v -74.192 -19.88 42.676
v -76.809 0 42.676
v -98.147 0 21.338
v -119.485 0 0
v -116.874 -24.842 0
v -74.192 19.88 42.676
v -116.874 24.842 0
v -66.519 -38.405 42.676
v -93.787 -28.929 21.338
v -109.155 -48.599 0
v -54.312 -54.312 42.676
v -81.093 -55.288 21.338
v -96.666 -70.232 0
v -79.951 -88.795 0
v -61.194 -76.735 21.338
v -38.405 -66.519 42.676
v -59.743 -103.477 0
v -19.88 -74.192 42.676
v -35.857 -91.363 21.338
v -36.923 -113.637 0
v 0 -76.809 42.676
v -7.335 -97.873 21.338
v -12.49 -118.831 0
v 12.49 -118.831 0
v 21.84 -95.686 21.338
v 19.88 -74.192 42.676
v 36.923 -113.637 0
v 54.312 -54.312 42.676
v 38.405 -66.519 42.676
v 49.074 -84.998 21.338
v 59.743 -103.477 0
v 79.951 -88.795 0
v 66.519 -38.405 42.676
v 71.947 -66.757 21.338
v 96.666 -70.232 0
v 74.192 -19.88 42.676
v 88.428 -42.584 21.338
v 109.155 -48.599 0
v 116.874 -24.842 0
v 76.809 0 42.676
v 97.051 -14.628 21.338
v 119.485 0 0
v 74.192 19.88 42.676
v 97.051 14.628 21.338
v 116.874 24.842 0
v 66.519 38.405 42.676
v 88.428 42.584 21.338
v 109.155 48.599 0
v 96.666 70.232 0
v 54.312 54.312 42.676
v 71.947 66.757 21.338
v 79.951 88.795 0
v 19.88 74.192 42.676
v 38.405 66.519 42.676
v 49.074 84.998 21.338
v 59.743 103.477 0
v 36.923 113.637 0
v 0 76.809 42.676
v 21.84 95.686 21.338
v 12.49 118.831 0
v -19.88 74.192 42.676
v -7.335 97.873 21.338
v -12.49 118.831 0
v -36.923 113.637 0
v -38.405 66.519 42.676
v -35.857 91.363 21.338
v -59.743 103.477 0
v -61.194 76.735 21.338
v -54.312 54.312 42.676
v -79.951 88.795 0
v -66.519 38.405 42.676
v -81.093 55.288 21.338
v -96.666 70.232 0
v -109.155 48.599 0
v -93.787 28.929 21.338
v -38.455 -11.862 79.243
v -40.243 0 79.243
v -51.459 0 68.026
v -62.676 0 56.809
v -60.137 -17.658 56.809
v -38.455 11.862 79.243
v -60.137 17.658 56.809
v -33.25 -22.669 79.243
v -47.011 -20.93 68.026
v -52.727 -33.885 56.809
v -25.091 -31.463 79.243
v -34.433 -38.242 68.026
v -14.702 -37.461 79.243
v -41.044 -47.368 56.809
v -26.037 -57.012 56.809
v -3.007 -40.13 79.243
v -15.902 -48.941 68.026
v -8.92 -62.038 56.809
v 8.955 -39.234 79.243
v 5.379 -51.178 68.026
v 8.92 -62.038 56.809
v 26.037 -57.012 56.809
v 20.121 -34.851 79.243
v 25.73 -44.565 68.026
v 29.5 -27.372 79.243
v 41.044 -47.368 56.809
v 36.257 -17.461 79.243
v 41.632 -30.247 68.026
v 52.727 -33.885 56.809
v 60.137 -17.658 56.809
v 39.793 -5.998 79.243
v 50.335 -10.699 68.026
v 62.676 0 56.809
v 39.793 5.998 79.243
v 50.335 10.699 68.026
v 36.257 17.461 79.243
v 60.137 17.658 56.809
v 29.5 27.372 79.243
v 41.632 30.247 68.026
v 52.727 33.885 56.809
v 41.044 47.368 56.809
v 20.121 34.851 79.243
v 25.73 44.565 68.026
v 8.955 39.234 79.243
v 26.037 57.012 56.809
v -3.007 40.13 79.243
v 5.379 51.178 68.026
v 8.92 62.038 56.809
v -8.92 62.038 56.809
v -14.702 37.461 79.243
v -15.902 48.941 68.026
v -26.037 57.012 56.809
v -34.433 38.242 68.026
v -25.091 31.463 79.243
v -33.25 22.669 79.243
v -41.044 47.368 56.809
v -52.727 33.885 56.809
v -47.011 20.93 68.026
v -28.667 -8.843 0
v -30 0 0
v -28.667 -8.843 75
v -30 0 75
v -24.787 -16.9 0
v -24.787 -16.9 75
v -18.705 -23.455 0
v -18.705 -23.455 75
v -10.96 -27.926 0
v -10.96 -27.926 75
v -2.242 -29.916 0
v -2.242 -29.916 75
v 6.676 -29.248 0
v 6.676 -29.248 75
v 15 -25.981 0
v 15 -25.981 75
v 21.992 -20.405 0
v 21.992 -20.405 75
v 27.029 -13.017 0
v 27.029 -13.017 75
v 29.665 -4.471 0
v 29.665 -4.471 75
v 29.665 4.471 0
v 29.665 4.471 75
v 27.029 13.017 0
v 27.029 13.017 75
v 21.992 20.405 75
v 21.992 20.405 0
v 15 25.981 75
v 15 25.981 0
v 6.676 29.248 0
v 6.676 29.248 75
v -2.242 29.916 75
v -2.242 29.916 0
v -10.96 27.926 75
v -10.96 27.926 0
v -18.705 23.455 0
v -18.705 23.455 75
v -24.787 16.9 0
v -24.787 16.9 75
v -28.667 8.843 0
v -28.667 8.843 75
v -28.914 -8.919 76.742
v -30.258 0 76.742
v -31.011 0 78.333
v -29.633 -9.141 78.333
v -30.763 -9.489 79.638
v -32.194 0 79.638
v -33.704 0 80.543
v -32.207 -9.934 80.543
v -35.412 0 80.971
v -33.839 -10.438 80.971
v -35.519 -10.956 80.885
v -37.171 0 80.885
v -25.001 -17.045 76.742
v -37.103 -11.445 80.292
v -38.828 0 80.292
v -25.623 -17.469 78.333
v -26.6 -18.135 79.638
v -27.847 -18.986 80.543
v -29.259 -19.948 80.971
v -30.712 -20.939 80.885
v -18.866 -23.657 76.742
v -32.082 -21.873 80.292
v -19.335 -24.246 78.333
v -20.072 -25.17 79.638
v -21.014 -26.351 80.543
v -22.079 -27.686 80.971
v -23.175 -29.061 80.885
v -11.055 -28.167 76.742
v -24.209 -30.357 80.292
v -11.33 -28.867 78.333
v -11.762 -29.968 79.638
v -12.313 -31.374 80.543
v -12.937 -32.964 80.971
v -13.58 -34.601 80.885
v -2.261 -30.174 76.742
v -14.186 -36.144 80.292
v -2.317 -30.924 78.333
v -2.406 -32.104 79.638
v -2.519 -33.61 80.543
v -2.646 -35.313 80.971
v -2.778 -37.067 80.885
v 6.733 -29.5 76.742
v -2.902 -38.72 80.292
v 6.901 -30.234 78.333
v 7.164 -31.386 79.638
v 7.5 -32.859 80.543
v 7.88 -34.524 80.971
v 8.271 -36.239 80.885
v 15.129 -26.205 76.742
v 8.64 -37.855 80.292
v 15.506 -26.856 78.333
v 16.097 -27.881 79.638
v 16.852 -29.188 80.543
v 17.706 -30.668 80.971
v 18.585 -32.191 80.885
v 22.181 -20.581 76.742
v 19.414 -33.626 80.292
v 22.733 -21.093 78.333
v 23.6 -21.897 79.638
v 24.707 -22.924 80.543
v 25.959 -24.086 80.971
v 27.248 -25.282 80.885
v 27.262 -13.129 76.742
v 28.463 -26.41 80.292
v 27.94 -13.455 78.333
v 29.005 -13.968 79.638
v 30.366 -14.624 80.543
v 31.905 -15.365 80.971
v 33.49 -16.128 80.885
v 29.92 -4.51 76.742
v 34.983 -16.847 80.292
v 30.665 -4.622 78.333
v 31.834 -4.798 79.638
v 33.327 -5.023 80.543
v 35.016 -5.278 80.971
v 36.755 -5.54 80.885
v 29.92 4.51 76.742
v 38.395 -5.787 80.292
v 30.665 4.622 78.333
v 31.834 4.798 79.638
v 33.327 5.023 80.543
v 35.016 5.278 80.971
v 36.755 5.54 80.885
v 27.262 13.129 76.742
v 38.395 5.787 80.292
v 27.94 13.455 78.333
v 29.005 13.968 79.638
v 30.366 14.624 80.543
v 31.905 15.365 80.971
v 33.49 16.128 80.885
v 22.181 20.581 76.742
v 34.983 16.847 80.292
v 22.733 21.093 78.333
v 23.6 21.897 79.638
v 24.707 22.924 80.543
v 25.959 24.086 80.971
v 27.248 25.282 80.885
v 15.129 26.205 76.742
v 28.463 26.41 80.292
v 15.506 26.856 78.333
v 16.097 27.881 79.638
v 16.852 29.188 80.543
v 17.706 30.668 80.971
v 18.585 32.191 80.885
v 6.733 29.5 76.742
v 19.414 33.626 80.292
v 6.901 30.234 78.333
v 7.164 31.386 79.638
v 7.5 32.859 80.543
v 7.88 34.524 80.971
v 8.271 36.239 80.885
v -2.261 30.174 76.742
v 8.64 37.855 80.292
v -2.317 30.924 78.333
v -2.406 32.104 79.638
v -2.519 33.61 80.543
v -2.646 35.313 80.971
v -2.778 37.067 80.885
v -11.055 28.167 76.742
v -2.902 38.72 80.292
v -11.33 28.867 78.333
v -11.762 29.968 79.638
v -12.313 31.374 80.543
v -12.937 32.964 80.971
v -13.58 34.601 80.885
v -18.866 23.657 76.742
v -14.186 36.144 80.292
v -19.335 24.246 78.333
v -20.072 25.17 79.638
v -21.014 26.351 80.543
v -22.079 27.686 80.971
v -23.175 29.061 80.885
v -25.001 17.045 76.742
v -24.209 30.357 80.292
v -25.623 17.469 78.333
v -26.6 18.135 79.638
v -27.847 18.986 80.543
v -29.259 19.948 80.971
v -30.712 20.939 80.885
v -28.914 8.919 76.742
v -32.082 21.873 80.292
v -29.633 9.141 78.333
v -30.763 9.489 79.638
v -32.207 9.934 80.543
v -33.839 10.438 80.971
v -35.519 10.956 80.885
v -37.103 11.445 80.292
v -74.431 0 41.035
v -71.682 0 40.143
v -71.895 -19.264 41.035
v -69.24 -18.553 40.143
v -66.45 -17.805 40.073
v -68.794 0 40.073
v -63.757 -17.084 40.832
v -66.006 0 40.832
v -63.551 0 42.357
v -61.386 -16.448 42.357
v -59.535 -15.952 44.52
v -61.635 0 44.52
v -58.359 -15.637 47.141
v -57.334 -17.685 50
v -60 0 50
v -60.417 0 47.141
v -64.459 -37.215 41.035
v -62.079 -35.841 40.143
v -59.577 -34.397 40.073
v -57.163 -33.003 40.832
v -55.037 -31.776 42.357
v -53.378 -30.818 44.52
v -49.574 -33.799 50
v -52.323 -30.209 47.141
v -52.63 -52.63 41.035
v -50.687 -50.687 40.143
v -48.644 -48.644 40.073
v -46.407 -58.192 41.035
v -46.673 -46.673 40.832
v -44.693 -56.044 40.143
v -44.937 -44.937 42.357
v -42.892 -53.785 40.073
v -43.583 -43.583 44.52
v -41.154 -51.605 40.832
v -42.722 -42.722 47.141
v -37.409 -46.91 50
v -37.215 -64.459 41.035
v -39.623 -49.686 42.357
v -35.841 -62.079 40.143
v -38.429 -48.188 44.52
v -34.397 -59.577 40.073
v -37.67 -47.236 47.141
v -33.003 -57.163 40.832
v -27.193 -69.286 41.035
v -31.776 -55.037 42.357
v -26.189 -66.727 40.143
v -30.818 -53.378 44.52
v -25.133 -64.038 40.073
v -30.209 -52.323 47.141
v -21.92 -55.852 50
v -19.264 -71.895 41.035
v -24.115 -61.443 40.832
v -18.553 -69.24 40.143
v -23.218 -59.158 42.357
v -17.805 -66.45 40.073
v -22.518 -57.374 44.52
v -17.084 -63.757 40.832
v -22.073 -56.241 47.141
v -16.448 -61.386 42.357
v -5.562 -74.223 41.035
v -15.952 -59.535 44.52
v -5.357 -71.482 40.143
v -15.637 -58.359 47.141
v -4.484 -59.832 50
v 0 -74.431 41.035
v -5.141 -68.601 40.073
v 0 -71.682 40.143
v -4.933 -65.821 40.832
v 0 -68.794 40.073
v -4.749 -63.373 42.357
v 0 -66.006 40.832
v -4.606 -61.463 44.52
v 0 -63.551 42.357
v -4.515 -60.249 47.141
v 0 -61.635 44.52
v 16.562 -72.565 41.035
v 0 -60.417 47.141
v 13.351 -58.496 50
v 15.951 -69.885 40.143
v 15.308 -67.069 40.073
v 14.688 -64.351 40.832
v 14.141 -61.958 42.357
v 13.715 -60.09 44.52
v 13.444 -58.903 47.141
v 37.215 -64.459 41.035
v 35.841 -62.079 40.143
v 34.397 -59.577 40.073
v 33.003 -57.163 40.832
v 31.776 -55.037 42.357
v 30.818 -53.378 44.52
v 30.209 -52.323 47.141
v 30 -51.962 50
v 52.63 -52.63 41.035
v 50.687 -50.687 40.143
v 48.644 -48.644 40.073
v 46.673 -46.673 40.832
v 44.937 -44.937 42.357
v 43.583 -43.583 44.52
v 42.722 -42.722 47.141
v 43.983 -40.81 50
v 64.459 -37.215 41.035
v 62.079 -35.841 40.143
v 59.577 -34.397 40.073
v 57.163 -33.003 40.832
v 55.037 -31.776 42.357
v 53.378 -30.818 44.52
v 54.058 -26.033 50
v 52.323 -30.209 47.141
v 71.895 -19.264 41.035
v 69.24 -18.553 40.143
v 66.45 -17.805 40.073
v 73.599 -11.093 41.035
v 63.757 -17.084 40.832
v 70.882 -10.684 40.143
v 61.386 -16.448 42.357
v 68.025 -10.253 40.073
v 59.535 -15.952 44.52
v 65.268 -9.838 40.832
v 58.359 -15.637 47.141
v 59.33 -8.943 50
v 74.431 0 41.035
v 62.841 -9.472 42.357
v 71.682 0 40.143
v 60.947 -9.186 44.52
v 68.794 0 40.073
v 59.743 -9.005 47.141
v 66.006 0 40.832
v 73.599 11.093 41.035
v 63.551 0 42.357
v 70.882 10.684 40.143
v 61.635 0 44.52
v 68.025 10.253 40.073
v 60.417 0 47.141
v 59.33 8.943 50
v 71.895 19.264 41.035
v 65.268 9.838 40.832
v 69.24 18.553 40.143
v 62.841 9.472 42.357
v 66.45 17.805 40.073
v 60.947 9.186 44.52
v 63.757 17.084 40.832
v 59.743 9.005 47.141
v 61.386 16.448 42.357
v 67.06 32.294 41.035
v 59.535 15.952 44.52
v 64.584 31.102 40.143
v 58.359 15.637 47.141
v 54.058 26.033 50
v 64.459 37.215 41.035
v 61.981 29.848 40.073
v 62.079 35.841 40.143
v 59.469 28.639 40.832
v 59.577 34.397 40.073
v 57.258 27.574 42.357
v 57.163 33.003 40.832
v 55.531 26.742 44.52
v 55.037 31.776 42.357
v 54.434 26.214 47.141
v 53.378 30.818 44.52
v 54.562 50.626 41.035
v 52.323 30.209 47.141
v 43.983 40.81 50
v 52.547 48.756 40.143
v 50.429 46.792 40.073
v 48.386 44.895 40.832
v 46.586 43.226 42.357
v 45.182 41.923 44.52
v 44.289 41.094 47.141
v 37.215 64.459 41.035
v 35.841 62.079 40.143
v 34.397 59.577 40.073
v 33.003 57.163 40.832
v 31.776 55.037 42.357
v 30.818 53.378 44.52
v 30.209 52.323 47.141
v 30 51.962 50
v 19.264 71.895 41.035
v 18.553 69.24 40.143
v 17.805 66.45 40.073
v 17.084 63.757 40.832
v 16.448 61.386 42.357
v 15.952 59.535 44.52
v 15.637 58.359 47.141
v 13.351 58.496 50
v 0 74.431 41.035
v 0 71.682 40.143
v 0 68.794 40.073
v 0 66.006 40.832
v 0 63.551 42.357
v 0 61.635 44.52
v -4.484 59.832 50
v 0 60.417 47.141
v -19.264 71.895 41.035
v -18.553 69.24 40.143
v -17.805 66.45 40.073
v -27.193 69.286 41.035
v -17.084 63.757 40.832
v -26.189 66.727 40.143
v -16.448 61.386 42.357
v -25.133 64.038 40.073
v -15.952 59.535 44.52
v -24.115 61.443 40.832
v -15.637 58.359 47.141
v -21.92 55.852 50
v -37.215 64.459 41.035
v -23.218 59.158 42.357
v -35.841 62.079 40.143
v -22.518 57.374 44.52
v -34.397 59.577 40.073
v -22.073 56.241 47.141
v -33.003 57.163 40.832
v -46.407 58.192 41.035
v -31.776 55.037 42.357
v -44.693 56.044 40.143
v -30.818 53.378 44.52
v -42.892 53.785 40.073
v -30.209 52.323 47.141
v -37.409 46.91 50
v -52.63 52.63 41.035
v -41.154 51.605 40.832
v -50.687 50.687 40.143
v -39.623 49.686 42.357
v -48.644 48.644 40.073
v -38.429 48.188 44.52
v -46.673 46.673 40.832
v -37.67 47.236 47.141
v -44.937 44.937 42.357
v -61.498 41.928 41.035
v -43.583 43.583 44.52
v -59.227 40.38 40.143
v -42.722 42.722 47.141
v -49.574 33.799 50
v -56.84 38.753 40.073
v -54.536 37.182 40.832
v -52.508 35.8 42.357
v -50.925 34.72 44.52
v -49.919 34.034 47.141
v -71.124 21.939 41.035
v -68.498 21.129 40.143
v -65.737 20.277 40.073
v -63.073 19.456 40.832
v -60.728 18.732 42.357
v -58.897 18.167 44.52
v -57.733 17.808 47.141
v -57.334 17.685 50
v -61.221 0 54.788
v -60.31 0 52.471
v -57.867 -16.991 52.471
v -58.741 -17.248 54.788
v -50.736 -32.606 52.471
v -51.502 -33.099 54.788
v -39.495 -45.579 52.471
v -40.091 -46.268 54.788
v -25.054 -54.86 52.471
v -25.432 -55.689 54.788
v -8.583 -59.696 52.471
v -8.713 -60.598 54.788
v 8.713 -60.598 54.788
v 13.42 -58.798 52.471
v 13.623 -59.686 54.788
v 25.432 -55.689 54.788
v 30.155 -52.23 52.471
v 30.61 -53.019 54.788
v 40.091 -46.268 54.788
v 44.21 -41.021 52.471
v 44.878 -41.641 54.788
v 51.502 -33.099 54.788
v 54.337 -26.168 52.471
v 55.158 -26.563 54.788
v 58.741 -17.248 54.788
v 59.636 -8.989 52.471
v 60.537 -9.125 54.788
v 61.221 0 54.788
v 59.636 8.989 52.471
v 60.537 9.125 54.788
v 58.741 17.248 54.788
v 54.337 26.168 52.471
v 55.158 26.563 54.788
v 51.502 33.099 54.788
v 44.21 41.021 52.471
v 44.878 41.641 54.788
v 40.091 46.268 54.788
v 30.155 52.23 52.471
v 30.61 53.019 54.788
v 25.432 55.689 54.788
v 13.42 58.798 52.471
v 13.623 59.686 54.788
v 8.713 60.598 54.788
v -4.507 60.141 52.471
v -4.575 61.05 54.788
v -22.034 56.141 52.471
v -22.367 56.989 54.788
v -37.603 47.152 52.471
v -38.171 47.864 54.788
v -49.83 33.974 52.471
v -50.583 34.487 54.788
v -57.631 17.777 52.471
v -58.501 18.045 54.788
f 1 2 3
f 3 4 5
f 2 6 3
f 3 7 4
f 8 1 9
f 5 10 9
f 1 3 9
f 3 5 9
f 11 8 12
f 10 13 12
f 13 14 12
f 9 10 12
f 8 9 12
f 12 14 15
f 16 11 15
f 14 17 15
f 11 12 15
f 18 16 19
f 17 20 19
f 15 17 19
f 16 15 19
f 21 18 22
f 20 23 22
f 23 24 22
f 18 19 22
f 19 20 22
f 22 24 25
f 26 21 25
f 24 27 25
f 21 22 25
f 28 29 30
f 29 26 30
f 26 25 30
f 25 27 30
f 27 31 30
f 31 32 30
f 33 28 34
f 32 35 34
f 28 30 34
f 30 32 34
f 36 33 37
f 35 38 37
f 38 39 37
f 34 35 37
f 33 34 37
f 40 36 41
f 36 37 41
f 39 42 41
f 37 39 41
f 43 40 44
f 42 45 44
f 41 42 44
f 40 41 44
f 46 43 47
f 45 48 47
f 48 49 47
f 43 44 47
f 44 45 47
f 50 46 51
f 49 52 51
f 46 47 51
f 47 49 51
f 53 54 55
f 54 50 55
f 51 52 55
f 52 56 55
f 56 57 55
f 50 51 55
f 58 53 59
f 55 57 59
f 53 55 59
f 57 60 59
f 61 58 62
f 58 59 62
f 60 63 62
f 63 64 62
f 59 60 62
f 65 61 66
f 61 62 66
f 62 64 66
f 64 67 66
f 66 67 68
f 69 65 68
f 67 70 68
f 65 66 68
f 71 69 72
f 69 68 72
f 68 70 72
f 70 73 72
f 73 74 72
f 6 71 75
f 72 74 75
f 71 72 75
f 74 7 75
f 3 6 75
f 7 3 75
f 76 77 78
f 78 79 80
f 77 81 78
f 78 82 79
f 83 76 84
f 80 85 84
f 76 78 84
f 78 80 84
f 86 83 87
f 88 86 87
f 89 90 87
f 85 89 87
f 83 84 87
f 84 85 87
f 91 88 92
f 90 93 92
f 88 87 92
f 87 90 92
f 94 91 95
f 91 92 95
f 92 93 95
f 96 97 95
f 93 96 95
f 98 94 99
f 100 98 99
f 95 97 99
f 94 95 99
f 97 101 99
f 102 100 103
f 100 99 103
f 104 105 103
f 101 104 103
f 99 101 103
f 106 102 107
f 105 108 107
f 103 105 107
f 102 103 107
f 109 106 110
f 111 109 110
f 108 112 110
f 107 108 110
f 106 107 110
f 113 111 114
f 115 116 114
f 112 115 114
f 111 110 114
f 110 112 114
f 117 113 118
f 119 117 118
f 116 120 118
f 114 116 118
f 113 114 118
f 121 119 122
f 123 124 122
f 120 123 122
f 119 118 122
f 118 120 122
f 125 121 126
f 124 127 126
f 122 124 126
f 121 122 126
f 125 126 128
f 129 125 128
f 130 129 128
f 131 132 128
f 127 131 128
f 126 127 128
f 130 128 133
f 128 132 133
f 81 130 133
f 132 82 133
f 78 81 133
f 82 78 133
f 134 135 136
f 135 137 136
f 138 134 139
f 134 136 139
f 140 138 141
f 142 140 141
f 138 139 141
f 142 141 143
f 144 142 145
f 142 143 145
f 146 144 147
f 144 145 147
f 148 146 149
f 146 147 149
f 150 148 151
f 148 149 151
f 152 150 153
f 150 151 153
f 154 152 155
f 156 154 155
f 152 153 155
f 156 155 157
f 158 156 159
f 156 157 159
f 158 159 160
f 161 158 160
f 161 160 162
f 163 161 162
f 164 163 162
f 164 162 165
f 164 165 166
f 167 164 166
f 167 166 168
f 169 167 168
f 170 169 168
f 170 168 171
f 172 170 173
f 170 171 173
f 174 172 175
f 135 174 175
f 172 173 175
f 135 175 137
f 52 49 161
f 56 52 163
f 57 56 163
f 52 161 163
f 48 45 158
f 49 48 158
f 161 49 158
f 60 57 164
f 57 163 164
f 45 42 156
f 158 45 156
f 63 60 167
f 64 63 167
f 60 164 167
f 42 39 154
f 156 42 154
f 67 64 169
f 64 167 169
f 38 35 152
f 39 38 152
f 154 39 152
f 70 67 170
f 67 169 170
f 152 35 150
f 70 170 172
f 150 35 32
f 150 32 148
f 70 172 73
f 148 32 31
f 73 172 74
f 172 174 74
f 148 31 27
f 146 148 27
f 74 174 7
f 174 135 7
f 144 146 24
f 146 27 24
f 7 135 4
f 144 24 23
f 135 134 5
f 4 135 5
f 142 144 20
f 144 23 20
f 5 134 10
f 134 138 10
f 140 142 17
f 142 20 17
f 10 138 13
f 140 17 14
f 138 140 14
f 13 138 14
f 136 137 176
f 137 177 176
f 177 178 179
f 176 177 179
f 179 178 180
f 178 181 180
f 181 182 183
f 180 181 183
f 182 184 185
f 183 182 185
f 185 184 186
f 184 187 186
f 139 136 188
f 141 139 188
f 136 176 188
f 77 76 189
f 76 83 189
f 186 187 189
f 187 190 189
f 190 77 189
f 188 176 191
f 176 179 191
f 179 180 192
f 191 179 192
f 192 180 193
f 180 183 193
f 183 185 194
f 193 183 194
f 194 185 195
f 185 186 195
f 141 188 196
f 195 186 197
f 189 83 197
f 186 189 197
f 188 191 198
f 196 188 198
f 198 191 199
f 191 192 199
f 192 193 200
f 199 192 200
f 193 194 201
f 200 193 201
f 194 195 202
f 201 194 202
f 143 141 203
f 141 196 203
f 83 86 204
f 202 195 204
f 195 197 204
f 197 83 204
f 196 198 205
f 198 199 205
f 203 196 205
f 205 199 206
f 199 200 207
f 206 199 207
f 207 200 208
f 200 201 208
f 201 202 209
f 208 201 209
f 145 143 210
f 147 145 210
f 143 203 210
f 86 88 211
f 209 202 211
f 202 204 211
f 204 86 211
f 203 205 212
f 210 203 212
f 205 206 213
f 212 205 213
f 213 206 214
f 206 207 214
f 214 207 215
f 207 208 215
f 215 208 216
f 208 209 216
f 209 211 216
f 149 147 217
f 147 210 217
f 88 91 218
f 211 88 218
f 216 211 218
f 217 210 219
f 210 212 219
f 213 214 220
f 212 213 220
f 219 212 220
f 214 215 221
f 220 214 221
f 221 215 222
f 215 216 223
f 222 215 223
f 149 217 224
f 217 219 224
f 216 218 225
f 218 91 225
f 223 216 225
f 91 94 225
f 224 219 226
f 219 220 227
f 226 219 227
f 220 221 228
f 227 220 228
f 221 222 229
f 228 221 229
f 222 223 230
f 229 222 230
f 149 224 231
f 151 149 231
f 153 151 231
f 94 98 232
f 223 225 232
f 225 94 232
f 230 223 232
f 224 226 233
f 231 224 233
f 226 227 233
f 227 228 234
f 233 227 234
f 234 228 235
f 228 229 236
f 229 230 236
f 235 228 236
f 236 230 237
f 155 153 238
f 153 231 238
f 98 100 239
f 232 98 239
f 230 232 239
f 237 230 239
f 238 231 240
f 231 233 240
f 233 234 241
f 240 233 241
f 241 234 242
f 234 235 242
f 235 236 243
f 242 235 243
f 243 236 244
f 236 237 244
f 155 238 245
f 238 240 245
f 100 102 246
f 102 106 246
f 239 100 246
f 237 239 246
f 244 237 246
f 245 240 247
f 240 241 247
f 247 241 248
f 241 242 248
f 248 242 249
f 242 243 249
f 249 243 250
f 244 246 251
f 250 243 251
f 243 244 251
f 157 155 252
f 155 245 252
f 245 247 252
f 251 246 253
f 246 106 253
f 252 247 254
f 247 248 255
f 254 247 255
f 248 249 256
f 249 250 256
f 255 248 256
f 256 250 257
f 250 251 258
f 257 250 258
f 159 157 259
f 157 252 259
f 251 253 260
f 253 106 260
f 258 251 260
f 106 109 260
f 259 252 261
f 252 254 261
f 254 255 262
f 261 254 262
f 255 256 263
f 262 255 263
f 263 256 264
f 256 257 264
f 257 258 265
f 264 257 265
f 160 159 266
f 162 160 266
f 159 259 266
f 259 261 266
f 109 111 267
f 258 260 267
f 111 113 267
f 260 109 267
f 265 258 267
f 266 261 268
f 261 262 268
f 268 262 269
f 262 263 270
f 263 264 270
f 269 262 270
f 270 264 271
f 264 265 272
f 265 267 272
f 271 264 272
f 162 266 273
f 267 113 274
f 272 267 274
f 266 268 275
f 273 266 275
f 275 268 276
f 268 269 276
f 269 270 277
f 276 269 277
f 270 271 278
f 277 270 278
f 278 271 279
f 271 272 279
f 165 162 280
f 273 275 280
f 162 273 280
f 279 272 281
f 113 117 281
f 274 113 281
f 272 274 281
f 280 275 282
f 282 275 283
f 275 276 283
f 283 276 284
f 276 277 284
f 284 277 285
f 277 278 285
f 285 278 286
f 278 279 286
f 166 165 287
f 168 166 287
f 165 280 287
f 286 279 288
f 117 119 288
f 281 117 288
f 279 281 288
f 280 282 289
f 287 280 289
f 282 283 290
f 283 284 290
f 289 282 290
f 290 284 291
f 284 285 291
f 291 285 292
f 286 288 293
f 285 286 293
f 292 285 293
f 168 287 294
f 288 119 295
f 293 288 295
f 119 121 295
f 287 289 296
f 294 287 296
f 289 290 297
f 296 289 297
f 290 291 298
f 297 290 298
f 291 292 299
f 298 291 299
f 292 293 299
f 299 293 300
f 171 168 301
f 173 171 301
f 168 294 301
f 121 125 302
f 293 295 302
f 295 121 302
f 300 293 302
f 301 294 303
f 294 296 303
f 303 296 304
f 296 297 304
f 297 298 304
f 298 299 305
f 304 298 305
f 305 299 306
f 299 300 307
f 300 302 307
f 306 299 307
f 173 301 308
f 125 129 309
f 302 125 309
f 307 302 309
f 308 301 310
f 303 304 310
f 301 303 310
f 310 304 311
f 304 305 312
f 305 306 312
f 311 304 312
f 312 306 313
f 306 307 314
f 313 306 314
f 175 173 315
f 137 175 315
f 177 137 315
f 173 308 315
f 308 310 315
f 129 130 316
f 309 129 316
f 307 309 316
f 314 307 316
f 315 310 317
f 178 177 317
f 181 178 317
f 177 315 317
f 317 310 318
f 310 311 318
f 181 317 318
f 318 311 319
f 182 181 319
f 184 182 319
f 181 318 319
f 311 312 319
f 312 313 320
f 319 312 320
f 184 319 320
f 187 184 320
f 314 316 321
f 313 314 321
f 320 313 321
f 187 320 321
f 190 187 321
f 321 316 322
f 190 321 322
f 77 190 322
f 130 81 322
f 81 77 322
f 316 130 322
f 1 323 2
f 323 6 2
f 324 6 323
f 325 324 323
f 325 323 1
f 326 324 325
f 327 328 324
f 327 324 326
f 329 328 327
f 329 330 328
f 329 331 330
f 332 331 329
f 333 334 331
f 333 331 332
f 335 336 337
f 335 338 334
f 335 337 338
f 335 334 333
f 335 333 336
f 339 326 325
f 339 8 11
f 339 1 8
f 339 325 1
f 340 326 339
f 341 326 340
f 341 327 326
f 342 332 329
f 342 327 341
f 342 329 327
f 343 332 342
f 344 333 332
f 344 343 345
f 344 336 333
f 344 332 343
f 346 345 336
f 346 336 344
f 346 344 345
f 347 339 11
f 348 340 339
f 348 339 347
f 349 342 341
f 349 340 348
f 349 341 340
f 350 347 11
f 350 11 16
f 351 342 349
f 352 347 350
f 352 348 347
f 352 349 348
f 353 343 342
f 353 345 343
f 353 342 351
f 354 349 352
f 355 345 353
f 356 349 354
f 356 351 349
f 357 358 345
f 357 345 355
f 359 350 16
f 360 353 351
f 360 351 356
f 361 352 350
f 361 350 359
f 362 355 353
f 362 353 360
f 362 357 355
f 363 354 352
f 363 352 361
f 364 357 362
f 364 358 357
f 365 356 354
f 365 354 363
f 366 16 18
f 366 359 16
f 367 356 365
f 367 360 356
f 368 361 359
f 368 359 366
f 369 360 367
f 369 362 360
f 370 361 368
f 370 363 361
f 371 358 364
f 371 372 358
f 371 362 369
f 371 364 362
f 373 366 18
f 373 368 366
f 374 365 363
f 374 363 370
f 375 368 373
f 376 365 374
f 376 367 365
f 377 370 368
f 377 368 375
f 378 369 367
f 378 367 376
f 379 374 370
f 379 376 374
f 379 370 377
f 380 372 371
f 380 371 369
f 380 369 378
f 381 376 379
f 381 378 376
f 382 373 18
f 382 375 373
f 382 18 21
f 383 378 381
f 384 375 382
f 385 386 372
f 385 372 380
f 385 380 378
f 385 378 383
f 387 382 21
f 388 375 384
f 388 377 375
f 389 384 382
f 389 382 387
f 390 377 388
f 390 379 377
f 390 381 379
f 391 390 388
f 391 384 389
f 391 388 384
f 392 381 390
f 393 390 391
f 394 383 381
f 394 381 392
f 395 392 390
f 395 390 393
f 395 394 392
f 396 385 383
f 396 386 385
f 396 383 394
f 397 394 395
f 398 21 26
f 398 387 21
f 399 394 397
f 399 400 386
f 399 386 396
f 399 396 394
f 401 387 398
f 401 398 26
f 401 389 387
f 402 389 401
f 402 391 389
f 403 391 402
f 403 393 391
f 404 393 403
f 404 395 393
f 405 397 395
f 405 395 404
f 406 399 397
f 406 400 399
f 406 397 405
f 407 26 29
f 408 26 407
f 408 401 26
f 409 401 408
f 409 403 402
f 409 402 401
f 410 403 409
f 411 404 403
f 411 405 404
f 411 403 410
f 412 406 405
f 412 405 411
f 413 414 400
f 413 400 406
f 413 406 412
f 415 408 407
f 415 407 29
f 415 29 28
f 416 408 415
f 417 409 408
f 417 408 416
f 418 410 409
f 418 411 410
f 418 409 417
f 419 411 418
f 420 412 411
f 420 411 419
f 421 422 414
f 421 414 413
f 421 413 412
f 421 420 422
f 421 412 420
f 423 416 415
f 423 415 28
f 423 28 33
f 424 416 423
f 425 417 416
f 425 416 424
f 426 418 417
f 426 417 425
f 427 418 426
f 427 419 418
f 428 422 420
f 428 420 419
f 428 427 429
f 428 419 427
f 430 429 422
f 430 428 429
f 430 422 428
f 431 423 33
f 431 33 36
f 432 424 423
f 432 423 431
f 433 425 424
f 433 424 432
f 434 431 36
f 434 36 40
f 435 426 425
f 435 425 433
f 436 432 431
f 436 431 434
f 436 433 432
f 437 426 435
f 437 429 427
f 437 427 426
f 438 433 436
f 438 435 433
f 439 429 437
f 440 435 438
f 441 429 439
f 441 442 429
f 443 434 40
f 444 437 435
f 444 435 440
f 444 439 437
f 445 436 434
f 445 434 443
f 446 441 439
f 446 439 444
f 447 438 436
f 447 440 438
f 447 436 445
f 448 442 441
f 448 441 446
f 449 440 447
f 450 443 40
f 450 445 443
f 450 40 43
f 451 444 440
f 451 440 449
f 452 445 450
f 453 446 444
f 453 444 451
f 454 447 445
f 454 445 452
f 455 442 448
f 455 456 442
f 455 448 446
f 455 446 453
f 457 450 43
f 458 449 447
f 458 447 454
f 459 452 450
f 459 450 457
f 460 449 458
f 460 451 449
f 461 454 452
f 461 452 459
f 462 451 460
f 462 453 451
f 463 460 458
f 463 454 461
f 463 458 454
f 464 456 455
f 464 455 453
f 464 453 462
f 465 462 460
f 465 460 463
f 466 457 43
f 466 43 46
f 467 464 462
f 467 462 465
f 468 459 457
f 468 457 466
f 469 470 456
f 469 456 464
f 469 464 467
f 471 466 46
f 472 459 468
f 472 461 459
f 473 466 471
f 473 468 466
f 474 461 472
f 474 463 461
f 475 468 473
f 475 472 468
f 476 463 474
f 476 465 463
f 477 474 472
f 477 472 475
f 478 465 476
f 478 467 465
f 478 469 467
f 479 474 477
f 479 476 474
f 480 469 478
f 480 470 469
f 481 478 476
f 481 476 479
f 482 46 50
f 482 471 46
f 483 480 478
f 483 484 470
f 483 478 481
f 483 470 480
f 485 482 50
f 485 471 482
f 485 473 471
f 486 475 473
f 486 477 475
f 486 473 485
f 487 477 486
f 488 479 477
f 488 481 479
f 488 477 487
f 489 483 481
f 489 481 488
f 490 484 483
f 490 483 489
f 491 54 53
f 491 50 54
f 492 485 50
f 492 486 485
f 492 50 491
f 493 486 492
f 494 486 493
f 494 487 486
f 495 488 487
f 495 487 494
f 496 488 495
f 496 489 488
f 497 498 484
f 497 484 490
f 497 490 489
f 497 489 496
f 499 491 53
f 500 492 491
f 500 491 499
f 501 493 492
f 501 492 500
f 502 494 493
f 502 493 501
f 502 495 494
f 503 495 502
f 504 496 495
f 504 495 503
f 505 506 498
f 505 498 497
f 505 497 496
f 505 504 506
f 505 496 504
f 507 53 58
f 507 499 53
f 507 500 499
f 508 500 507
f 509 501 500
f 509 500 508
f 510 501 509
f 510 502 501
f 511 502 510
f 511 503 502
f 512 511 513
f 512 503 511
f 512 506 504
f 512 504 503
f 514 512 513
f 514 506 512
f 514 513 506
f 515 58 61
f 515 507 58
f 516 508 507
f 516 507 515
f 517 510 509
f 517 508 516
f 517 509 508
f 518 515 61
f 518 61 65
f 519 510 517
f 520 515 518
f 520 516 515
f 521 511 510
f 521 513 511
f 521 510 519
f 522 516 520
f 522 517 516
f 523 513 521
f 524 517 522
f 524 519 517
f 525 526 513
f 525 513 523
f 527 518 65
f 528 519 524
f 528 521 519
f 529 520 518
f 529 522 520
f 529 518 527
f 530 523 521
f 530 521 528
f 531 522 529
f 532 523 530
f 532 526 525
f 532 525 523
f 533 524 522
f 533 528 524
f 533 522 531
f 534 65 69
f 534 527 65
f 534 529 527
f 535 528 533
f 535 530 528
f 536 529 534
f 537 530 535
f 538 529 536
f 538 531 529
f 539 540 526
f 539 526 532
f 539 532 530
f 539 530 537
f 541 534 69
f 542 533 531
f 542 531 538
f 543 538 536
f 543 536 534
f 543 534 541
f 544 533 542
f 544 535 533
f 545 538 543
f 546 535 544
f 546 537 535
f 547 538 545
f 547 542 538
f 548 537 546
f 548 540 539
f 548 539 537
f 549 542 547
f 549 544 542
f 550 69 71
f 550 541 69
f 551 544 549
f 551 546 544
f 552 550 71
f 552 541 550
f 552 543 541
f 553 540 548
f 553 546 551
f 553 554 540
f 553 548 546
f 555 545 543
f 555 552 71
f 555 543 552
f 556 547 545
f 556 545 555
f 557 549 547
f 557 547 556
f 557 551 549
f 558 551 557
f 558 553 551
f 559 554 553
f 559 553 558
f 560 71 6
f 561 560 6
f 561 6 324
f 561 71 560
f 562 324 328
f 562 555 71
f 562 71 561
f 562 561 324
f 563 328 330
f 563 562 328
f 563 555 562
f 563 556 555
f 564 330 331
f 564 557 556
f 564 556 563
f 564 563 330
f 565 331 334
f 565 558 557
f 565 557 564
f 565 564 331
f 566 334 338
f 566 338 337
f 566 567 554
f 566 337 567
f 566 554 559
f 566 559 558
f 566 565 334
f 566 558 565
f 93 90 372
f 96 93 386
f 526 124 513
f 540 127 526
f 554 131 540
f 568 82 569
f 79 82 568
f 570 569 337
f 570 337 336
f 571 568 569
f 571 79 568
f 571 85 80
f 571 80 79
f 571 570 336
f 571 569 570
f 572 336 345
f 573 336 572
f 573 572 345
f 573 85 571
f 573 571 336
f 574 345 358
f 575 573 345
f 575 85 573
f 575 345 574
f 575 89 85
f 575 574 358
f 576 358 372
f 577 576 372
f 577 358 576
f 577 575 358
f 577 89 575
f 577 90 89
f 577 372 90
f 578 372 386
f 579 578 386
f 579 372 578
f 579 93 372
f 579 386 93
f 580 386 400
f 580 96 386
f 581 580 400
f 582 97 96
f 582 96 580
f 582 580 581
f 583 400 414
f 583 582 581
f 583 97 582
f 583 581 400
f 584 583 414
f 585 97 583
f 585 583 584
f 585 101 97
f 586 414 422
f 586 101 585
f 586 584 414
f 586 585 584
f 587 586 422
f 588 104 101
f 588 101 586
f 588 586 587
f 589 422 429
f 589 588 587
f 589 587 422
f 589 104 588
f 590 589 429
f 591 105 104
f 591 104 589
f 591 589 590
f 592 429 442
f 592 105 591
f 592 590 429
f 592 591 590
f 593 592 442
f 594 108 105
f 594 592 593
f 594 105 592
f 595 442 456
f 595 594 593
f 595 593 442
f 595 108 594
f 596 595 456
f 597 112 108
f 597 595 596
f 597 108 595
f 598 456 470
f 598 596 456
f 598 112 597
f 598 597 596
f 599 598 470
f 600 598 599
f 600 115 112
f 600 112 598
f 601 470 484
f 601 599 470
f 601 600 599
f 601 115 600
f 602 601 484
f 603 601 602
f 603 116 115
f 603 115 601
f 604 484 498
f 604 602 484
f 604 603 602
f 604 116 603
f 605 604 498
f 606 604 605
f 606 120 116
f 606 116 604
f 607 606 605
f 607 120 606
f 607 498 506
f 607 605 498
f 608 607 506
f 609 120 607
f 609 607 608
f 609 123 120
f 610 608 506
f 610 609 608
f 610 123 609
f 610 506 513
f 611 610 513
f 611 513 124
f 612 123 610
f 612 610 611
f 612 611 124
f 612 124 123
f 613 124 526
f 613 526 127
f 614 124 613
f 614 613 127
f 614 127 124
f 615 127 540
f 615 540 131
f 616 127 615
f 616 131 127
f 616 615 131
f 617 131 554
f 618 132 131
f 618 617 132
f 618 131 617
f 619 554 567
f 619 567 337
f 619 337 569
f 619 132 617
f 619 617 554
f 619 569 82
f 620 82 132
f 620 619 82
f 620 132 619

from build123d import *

# Parameters (mm, degrees)
F2_R = 10


with BuildPart() as f1:
    # F0 (on Front) → F1 (revolve)
    with BuildSketch(Plane.XZ):
        with BuildLine():
            Line((-119.485281, 0), (-30, 0))
            Line((-30, 0), (-30, 75))
            ThreePointArc((-30, 75), (-33.703899, 80.543277), (-40.242641, 79.242641))
            Line((-40.242641, 79.242641), (-119.485281, 0))
        make_face()
    revolve(axis=Axis((0, 0, 64.130453), (0, 0, 1)))

    # F2 (on Front) → F3 (revolve, cut)
    with BuildSketch(Plane.XZ):
        with Locations((-70, 50)):
            Circle(F2_R)
    revolve(axis=Axis((0, 0, 64.130453), (0, 0, 1)), mode=Mode.SUBTRACT)


solid = f1.part
